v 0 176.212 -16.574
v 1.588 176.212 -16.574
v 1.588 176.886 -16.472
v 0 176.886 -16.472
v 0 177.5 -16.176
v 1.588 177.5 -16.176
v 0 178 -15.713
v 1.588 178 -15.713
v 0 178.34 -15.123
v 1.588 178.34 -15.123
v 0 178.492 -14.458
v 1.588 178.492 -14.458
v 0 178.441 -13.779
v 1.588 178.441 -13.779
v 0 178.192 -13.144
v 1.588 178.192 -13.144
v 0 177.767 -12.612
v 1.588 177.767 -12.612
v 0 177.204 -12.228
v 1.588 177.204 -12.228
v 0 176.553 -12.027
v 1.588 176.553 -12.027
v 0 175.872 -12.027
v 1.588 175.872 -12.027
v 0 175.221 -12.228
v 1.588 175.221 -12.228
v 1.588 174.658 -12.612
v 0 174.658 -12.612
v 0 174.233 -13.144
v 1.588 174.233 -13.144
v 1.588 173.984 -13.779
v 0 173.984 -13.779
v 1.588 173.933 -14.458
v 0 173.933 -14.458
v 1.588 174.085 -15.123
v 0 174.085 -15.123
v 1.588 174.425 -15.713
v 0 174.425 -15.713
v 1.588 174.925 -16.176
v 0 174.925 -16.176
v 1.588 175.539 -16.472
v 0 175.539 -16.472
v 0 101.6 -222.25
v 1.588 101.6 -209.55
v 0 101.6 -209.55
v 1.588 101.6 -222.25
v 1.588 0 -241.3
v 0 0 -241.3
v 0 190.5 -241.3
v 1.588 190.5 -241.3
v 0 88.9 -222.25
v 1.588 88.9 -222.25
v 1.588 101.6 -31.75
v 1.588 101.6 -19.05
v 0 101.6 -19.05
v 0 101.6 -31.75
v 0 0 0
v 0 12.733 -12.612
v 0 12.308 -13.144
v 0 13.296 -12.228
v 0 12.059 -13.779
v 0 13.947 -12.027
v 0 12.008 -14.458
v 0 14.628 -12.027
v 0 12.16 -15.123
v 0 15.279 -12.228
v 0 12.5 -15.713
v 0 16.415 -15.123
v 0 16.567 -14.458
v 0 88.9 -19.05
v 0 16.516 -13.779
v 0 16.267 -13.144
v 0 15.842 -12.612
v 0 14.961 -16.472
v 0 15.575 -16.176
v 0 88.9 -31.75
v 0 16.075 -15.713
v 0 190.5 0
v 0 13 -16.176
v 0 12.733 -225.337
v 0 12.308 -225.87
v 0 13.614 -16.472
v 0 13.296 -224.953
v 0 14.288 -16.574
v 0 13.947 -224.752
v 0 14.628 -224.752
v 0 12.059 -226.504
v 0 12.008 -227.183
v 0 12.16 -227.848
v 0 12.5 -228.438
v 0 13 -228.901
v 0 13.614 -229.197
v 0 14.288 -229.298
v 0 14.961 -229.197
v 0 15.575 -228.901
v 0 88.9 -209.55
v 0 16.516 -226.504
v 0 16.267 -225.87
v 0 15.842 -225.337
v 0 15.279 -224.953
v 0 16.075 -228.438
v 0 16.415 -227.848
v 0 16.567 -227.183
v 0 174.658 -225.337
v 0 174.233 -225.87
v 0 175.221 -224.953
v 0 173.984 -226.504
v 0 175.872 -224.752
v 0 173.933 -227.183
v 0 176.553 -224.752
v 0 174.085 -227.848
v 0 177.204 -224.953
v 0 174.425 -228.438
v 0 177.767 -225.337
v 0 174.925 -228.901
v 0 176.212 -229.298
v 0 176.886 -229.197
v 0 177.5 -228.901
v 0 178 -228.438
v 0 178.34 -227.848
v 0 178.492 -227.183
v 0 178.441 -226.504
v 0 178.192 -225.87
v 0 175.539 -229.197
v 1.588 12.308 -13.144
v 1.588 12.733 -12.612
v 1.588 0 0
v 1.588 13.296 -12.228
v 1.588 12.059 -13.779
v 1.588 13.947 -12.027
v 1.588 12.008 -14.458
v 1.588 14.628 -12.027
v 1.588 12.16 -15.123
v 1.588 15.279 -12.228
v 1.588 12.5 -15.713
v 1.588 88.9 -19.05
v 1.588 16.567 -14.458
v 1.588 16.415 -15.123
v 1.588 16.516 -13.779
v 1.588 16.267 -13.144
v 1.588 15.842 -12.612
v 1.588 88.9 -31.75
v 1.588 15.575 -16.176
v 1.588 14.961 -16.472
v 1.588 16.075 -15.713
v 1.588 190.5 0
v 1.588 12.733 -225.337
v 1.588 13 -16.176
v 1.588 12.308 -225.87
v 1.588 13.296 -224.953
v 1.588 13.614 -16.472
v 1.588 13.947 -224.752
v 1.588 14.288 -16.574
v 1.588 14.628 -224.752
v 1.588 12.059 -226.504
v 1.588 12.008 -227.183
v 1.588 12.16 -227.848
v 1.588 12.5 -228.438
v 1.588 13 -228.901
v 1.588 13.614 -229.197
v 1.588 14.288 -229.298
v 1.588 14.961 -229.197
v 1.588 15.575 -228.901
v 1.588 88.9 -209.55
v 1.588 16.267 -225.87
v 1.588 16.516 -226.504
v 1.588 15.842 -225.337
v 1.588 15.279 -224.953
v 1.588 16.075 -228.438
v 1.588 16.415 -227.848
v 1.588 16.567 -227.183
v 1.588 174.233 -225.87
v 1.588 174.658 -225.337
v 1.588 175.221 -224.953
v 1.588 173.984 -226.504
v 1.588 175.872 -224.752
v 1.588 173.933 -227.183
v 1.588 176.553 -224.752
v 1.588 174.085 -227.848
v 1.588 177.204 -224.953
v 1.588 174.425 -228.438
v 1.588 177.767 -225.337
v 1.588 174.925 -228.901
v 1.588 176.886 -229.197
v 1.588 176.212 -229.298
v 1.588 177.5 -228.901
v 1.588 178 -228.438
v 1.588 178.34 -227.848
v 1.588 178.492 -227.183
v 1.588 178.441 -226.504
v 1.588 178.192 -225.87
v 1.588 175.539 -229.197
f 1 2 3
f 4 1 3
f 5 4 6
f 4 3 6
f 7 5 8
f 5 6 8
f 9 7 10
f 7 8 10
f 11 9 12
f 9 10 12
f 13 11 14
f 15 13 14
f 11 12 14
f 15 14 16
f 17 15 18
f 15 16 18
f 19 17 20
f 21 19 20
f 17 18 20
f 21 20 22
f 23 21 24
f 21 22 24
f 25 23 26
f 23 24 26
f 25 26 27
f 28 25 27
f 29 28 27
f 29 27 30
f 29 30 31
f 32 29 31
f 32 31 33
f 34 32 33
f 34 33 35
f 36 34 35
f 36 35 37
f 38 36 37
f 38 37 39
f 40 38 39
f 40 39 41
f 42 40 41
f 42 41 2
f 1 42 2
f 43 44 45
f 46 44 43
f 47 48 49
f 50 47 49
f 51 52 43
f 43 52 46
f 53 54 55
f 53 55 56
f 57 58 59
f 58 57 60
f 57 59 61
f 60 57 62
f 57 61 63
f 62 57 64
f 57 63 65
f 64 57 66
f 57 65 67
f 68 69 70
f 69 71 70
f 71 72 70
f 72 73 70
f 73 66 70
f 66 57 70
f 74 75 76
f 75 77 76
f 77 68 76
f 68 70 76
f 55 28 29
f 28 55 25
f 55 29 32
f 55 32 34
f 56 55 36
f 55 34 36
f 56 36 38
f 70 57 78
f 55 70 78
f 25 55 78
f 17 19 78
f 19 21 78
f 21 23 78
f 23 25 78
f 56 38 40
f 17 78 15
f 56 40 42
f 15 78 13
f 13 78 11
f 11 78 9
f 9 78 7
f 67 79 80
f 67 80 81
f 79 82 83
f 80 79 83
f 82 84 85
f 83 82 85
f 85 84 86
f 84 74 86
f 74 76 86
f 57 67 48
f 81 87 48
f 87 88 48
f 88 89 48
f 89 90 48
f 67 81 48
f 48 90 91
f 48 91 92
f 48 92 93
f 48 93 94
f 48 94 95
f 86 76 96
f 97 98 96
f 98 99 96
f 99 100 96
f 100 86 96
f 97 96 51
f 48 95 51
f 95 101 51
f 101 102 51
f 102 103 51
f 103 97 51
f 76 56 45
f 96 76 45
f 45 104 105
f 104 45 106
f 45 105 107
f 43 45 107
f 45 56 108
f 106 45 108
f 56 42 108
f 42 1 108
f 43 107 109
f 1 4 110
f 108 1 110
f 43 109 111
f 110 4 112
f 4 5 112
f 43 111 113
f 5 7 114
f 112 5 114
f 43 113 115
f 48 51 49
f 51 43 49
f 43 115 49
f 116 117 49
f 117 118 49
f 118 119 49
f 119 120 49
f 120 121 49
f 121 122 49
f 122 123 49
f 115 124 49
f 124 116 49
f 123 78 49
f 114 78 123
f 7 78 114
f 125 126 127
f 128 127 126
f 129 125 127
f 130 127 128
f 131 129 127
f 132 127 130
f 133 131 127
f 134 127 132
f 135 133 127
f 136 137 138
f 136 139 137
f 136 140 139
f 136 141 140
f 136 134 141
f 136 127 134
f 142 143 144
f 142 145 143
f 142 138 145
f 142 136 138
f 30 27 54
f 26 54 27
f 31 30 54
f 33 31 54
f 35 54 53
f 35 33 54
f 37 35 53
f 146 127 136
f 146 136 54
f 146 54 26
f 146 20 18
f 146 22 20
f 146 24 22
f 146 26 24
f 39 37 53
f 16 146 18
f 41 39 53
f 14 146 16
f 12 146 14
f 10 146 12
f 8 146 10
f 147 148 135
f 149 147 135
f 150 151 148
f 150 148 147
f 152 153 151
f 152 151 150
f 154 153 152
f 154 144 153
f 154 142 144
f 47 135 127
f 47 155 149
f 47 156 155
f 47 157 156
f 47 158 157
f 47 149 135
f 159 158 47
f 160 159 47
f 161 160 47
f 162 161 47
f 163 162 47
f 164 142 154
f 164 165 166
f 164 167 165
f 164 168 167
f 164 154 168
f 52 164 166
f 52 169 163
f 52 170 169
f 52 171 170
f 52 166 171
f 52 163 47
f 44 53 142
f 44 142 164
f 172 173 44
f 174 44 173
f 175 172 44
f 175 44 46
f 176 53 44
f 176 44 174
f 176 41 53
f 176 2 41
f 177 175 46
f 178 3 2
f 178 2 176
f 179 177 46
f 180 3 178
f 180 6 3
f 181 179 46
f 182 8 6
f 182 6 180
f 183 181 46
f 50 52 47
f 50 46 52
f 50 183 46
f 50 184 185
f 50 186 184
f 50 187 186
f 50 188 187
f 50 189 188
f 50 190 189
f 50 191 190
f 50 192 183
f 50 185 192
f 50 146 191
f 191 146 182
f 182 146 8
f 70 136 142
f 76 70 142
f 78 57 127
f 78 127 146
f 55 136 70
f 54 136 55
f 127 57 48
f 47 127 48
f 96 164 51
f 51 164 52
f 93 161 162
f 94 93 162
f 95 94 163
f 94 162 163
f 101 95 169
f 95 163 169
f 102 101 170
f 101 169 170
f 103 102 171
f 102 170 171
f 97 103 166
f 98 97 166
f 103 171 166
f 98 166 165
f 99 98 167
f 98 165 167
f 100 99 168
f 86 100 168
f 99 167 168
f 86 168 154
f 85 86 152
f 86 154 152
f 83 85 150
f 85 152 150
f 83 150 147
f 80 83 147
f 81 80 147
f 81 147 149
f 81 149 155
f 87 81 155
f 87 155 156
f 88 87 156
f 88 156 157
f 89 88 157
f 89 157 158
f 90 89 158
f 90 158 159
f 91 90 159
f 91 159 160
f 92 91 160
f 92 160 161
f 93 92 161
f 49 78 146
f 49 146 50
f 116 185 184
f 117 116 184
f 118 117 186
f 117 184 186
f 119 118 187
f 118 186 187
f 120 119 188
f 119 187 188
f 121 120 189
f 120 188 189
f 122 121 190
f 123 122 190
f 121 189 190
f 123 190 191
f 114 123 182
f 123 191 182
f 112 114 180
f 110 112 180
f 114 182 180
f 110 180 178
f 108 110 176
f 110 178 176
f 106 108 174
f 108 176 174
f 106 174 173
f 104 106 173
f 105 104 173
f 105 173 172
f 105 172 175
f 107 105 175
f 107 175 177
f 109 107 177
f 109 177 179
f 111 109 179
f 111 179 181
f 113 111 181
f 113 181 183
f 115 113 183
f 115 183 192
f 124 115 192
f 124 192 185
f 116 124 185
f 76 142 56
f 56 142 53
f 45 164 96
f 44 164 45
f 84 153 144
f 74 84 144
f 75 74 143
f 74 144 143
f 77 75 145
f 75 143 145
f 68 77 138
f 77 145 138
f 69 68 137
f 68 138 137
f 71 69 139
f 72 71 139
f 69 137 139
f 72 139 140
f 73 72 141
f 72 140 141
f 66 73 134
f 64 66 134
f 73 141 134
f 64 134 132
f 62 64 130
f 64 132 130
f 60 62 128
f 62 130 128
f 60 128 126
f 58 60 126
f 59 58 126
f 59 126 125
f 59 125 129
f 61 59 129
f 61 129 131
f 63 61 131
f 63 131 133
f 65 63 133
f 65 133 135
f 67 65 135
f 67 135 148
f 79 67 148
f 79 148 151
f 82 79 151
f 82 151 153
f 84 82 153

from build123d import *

# Parameters (mm, degrees)
SKETCH1_W           = 241.3
SKETCH1_H           = 190.5
BOSS_EXTRUDE1_DEPTH = 1.5875
SKETCH2_R           = 2.286
CUT_EXTRUDE1_DEPTH  = 2.5875
SKETCH3_W           = 12.7
SKETCH3_H           = 12.7
CUT_EXTRUDE2_DEPTH  = 2.5875


with BuildPart() as part:
    # Sketch1 → Boss-Extrude1 (new body)
    with BuildSketch(Plane(origin=(0, 0, 0), x_dir=(0, 0, -1), z_dir=(1, 0, 0))):
        with Locations((120.65, 95.25)):
            Rectangle(SKETCH1_W, SKETCH1_H)
    extrude(amount=BOSS_EXTRUDE1_DEPTH)

    # Sketch2 → Cut-Extrude1 (cut, through all)
    with BuildSketch(Plane(origin=(1.5875, 0, 0), x_dir=(0, 0, -1), z_dir=(1, 0, 0))):
        with Locations((227.0125, 14.2875)):
            Circle(SKETCH2_R)
        with Locations((227.0125, 176.2125)):
            Circle(SKETCH2_R)
        with Locations((14.2875, 14.2875)):
            Circle(SKETCH2_R)
        with Locations((14.2875, 176.2125)):
            Circle(SKETCH2_R)
    extrude(amount=-CUT_EXTRUDE1_DEPTH, mode=Mode.SUBTRACT)

    # Sketch3 → Cut-Extrude2 (cut, through all)
    with BuildSketch(Plane(origin=(1.5875, 0, 0), x_dir=(0, 0, -1), z_dir=(1, 0, 0))):
        with Locations((25.4, 95.25)):
            Rectangle(SKETCH3_W, SKETCH3_H)
        with Locations((215.9, 95.25)):
            Rectangle(SKETCH3_W, SKETCH3_H)
    extrude(amount=-CUT_EXTRUDE2_DEPTH, mode=Mode.SUBTRACT)


solid = part.part
